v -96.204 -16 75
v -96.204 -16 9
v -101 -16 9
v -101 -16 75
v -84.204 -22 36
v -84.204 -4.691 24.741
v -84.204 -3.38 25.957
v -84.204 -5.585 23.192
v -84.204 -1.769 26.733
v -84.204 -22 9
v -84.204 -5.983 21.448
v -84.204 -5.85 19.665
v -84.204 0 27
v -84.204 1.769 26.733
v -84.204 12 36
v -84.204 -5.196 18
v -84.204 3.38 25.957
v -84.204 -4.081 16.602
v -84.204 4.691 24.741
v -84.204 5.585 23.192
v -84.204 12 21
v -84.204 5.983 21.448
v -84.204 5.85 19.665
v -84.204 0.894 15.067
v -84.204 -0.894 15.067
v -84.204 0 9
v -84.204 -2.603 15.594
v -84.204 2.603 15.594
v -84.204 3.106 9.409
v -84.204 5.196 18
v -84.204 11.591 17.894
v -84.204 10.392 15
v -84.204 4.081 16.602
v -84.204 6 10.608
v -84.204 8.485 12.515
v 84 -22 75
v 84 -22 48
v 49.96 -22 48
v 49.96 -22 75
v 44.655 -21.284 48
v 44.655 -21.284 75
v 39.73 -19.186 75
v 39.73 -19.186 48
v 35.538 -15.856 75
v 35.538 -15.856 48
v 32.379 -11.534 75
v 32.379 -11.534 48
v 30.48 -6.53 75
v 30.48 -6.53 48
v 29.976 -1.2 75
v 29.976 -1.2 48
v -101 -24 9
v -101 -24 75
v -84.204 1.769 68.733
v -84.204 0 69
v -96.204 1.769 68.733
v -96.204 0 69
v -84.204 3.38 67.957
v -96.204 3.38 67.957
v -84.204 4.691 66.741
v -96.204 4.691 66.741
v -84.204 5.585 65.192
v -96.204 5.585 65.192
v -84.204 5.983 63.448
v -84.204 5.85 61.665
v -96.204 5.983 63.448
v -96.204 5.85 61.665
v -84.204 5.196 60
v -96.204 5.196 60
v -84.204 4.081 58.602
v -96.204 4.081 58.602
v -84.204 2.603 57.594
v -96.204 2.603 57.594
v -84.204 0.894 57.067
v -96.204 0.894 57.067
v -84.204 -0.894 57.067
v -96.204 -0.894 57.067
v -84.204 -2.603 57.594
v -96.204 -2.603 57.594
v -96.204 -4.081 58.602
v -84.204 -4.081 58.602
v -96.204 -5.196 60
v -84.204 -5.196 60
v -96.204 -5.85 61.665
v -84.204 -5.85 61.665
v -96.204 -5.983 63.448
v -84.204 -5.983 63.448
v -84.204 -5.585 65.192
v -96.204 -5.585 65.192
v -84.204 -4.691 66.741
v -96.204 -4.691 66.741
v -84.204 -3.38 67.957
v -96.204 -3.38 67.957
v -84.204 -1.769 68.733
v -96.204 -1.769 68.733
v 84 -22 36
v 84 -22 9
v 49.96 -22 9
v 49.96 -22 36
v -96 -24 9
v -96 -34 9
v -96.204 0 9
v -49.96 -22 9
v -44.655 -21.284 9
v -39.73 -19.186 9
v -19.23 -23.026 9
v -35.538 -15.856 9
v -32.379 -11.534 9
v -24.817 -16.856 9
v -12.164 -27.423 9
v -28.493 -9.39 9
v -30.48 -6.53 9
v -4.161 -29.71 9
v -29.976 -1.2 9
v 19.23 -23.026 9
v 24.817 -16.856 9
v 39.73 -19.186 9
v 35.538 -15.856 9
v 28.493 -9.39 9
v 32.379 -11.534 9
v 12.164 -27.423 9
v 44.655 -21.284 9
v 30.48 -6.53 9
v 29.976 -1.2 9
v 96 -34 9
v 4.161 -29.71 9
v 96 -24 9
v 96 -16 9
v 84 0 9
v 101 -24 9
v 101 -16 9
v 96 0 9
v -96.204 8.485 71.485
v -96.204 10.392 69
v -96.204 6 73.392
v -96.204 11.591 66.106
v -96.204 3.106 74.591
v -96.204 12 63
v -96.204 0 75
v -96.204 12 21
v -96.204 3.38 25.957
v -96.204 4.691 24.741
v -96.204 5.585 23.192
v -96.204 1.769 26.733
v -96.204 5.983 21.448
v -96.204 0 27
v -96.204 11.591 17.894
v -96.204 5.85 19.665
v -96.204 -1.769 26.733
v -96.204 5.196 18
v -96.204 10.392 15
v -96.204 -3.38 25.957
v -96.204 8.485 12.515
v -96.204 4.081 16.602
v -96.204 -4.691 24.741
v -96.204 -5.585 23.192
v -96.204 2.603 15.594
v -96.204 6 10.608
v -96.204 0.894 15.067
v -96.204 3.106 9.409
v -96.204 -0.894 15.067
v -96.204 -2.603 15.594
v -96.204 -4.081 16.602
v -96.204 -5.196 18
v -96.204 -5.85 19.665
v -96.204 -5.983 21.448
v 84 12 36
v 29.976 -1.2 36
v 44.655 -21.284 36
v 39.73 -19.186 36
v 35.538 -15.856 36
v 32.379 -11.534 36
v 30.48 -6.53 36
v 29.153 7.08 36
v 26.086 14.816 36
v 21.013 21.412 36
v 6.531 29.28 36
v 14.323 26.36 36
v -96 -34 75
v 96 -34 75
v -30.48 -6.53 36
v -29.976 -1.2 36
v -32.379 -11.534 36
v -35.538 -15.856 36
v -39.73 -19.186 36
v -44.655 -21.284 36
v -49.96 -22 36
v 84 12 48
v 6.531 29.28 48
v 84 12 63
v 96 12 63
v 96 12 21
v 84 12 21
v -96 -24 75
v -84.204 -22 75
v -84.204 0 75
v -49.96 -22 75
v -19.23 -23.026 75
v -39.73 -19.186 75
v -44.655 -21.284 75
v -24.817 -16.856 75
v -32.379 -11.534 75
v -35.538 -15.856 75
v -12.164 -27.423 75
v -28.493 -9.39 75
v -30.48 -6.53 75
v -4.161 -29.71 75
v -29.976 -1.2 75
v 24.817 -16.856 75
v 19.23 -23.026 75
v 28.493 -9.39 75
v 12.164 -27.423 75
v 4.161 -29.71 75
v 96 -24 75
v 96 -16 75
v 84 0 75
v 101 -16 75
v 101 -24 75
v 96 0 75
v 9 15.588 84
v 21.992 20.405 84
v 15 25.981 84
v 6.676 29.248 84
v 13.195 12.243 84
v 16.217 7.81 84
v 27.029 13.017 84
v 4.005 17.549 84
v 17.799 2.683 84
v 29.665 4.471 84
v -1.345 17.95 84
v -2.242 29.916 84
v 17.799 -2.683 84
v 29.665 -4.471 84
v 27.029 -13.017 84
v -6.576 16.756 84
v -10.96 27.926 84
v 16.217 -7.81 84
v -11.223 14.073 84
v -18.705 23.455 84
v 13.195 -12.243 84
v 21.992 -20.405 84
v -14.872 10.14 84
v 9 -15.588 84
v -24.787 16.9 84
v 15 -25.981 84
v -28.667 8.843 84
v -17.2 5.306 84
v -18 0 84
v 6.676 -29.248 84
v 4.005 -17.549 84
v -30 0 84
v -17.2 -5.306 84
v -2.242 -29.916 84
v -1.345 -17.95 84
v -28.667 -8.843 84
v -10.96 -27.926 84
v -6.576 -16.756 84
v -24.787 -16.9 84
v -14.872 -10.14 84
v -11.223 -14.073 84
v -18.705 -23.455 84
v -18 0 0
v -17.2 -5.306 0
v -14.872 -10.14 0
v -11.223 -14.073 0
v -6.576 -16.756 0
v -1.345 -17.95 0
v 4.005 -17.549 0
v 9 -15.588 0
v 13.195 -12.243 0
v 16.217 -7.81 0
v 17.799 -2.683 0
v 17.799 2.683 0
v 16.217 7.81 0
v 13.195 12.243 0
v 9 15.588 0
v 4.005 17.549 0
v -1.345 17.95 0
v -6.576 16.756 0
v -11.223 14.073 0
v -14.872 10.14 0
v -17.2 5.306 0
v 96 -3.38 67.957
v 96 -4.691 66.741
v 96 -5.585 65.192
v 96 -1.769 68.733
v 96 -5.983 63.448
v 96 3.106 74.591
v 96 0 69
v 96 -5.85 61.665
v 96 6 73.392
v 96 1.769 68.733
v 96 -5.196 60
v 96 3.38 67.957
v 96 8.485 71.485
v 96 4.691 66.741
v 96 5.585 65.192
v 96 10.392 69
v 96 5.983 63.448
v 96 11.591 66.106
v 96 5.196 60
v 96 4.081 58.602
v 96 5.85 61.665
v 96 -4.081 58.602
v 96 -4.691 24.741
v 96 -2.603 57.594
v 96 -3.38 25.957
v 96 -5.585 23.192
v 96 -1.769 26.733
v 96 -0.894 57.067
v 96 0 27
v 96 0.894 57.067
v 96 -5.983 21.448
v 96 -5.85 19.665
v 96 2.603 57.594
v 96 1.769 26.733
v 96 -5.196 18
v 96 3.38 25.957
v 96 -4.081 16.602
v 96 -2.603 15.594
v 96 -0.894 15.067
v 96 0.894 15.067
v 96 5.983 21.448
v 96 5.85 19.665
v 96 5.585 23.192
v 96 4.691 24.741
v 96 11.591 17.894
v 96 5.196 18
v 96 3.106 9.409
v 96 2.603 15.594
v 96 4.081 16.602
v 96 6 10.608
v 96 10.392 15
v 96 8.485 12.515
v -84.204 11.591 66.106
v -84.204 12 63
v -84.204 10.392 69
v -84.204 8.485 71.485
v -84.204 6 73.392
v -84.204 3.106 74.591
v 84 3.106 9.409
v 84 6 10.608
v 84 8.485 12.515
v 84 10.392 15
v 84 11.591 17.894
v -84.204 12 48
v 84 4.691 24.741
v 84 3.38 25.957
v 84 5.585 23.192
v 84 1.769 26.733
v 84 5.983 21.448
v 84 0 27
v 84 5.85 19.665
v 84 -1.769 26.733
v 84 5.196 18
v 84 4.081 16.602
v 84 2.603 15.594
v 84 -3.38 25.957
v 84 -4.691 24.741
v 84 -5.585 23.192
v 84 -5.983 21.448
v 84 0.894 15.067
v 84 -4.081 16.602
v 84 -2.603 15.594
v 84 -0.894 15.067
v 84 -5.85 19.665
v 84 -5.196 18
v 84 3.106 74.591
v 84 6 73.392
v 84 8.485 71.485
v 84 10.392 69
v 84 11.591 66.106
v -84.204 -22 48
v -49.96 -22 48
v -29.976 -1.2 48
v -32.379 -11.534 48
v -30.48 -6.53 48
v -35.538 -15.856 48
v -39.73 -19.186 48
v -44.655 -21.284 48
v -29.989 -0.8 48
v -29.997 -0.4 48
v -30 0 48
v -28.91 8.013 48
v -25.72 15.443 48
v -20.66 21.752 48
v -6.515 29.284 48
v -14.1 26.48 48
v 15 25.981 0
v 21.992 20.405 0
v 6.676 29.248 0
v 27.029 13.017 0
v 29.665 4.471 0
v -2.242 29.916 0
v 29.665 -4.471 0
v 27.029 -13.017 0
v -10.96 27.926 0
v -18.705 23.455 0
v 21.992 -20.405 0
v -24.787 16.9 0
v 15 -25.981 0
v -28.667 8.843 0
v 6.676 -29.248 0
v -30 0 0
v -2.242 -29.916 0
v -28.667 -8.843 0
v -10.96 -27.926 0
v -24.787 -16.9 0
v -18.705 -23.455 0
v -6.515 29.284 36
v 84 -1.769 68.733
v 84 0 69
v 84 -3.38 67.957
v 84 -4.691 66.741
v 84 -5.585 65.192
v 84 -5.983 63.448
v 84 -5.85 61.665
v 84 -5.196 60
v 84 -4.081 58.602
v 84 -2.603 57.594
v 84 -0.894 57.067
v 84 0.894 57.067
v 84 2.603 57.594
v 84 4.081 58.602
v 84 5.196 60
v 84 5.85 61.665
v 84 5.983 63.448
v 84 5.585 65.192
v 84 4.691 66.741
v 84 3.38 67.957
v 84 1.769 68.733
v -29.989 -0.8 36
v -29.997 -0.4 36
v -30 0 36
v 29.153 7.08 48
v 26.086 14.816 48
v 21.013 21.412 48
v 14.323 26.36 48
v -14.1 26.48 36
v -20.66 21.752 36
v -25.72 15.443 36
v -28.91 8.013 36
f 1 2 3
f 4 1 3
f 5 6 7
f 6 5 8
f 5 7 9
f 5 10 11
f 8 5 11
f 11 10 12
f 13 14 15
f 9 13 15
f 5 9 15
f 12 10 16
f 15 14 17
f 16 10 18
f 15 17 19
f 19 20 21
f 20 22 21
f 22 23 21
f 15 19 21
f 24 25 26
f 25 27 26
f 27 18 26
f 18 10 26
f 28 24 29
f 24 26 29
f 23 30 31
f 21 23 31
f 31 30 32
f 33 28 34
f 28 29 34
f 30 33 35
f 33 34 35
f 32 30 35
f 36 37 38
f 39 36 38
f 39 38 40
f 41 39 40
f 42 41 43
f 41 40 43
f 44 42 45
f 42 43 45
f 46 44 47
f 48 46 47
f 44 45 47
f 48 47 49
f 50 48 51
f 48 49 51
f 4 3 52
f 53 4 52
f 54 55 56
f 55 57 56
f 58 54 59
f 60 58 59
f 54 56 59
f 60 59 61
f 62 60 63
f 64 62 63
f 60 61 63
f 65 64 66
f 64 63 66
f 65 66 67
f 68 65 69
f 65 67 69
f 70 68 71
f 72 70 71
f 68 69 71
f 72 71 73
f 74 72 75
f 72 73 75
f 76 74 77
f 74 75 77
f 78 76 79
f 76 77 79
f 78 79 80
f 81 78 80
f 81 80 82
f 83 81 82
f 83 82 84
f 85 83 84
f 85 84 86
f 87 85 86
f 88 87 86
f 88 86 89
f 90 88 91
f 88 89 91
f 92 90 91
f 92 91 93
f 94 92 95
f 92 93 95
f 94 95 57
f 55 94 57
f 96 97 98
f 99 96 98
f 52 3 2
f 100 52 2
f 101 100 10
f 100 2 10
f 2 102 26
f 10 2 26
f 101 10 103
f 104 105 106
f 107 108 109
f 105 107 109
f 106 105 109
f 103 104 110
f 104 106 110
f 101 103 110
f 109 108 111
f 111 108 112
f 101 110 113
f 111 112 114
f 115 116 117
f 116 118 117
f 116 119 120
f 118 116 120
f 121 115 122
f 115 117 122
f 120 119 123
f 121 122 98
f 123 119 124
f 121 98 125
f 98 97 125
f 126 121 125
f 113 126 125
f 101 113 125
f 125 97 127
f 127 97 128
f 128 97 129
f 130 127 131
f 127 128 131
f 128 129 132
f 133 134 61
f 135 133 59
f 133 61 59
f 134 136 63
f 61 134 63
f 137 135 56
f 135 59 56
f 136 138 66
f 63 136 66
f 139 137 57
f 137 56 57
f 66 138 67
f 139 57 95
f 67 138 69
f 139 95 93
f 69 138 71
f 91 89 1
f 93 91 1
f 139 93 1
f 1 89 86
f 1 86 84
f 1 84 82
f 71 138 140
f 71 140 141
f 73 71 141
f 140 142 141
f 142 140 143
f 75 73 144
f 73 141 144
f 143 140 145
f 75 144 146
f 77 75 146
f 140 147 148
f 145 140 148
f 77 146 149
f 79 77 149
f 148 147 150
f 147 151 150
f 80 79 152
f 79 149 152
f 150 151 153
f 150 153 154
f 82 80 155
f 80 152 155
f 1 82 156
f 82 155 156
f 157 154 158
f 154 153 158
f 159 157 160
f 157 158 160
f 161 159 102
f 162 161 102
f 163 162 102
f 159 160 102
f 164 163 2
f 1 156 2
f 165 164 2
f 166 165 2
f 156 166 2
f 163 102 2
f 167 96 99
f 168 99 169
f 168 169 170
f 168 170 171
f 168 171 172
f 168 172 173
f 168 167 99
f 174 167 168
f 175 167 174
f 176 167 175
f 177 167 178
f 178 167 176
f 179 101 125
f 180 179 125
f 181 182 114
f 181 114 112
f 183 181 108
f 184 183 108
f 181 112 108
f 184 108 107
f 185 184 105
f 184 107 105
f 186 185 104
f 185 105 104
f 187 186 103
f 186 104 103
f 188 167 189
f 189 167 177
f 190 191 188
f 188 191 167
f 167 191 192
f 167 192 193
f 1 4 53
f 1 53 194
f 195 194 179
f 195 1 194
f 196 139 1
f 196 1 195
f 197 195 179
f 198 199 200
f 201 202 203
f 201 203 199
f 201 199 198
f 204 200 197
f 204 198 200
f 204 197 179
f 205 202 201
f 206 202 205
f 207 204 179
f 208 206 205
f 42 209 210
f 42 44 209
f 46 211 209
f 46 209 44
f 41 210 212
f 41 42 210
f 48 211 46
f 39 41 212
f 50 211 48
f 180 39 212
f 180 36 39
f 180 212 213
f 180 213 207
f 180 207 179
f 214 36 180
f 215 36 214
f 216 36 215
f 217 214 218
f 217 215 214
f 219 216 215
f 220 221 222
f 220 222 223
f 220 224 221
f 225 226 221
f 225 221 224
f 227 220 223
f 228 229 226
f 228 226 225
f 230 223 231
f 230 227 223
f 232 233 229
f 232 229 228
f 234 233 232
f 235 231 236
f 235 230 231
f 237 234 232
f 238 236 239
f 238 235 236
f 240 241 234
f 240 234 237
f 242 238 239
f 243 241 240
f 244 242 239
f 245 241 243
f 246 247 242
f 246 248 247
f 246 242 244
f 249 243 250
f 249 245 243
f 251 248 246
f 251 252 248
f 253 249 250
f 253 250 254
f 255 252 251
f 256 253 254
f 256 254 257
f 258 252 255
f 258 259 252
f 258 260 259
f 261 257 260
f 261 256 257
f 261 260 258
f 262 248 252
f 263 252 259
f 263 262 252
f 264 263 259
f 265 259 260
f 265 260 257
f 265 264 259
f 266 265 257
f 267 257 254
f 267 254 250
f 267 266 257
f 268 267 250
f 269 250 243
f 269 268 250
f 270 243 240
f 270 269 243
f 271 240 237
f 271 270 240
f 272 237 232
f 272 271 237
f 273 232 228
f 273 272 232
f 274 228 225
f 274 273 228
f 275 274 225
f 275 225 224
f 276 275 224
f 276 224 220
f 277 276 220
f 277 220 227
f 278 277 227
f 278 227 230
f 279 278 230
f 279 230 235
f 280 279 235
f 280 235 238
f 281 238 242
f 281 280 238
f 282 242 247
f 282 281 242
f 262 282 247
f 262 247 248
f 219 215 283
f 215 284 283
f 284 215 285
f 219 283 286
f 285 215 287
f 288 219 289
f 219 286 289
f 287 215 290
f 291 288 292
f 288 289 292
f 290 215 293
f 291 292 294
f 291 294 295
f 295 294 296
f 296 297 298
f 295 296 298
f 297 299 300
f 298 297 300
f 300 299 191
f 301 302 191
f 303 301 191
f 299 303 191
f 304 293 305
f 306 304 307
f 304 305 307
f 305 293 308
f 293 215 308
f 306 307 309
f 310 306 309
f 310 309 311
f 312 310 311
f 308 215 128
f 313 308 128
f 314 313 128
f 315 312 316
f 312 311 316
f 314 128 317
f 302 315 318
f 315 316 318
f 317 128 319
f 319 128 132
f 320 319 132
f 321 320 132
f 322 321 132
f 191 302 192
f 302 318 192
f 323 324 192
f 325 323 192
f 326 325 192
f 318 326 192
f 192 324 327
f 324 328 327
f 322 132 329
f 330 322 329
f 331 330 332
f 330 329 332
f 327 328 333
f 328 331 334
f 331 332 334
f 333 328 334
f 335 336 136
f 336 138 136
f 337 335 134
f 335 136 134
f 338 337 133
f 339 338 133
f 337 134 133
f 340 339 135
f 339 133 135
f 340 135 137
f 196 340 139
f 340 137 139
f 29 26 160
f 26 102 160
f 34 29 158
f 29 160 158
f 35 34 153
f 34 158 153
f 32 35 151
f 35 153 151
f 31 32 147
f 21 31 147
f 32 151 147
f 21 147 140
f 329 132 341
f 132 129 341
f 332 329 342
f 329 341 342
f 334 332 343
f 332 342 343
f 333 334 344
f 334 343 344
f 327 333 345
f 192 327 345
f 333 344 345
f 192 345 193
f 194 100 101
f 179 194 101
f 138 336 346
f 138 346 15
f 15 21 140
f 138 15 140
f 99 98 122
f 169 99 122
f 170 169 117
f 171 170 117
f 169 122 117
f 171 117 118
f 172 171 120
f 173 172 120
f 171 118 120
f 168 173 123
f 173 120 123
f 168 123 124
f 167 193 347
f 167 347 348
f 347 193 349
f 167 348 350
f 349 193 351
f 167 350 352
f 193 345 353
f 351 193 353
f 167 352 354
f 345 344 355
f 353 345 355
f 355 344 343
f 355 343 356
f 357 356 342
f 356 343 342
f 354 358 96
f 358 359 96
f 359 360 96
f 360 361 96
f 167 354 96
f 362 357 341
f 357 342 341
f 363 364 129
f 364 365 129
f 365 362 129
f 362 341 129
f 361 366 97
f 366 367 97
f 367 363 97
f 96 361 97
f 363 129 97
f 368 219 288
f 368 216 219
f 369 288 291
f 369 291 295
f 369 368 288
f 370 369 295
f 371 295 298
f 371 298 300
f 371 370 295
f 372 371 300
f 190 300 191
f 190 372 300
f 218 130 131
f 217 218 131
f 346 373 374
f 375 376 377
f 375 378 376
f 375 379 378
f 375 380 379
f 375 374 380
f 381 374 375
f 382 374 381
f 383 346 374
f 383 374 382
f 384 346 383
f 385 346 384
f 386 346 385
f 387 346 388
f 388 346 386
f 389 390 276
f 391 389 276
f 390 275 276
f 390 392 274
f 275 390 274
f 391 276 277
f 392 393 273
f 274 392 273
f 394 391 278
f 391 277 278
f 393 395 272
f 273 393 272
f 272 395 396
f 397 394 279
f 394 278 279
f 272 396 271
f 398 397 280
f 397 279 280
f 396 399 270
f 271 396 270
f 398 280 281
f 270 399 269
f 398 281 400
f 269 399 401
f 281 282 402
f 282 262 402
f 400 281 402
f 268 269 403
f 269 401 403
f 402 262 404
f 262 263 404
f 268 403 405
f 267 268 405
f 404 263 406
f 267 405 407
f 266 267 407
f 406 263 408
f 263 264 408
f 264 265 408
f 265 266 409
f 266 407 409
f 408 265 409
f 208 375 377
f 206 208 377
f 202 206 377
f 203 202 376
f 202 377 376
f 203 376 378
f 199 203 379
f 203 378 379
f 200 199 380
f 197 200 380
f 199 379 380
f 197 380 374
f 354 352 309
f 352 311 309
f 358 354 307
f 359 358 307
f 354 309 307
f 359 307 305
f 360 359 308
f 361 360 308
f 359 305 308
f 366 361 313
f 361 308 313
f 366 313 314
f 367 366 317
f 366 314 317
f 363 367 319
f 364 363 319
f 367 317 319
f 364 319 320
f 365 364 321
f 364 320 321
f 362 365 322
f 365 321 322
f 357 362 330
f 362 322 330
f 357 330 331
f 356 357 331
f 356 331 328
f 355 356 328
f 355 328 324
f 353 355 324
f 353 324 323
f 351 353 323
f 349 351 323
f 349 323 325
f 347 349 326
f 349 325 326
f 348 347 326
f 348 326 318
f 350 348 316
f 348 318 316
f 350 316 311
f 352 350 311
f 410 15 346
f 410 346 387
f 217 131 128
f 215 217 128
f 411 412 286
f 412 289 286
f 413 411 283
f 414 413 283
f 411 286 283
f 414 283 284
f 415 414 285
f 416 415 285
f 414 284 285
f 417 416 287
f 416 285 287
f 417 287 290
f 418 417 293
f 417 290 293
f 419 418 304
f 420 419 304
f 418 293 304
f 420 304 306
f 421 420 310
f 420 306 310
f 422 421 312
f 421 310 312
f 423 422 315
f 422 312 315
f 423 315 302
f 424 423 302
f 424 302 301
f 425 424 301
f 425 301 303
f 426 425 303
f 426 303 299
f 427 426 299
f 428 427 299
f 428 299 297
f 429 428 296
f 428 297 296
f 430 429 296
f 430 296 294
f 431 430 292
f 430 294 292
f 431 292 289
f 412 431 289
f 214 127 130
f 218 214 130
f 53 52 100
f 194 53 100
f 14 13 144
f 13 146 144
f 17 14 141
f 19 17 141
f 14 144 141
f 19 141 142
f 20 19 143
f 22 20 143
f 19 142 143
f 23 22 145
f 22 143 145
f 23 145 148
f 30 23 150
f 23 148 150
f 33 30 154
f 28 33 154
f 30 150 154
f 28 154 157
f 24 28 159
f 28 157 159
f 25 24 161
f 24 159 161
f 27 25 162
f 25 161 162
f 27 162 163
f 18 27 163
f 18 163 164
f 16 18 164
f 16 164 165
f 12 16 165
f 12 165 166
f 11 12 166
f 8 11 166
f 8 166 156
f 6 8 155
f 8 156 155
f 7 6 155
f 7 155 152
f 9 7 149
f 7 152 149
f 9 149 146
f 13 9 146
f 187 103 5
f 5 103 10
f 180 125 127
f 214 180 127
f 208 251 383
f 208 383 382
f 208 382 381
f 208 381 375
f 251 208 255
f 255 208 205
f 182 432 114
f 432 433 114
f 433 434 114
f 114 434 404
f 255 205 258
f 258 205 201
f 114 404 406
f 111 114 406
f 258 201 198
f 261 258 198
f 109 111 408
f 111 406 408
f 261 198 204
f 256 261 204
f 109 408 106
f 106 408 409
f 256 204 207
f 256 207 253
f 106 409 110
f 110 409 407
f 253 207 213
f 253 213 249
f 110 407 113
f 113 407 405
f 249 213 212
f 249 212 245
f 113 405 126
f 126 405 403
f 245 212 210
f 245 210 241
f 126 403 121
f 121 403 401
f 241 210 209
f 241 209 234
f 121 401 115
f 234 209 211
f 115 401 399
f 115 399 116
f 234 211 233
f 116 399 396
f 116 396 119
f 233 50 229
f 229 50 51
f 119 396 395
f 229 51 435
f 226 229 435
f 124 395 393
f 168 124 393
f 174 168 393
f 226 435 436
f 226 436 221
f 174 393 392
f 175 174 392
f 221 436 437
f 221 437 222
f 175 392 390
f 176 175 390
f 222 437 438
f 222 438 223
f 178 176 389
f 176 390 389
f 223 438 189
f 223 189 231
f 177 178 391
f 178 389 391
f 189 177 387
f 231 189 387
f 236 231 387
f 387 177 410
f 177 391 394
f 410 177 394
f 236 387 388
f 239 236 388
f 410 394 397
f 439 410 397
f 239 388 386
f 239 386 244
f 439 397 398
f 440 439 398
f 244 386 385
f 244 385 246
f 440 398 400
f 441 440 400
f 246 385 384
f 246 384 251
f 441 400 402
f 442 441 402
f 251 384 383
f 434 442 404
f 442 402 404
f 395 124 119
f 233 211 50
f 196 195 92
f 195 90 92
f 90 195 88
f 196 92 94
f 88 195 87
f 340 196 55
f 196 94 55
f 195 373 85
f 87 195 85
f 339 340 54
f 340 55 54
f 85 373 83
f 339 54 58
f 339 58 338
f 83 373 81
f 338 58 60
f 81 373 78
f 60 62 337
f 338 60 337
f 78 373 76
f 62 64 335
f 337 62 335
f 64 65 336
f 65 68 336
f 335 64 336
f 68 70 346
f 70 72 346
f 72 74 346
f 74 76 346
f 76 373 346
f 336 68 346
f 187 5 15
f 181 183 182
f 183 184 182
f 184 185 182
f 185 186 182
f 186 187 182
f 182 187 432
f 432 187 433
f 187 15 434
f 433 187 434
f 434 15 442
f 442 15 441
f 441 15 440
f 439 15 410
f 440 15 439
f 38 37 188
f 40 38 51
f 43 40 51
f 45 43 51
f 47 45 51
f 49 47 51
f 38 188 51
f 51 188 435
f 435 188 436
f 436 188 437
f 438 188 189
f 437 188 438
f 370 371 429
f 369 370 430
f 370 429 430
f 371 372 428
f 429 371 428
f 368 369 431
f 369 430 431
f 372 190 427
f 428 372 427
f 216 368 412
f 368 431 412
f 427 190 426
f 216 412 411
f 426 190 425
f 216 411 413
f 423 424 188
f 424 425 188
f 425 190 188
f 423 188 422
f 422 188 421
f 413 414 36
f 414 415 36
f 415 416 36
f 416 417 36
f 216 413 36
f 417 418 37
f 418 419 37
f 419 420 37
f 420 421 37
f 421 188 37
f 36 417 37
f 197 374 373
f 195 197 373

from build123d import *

# Parameters (mm, degrees)
SKETCH1_R                      = 30
SKETCH1_R_2                    = 18
BOSS_EXTRUDE1_DEPTH            = 84
BOSS_EXTRUDE3_DEPTH            = 66
CUT_EXTRUDE1_REACH             = 218.843
SKETCH3_R                      = 6
CUT_EXTRUDE1_DIRECTION_2_DEPTH = 217.843261366
FILLET1_R                      = 12
CUT_EXTRUDE2_REACH             = 219.029
SKETCH4_R                      = 6
FILLET2_R                      = 12
RIB1_REACH                     = 116.547
SKETCH5_WALL_W                 = 310.682445014
SKETCH5_WALL_H                 = 12
RIB2_REACH                     = 116.547
SKETCH6_WALL_W                 = 310.466406556
SKETCH6_WALL_H                 = 12


with BuildPart() as part:
    # Sketch1 → Boss-Extrude1 (new body)
    with BuildSketch(Plane.XY):
        with Locations(Location((0, 0, 0), (0, 0, 180))):
            Circle(SKETCH1_R)
        with Locations(Location((0, 0, 0), (0, 0, 180))):
            Circle(SKETCH1_R_2, mode=Mode.SUBTRACT)
    extrude(amount=BOSS_EXTRUDE1_DEPTH)

    # Sketch2 → Boss-Extrude3 (add)
    with BuildSketch(Plane.XY.offset(9)):
        with BuildLine():
            Line((96, -24), (101, -24))
            Line((101, -24), (101, -16))
            Line((101, -16), (96, -16))
            Line((96, -16), (96, 12))
            Line((96, 12), (84, 12))
            Line((84, 12), (84, -22))
            Line((84, -22), (49.959983987, -22))
            ThreePointArc((49.959983987, -22), (35.537778885, -15.856406461), (29.975990392, -1.2))
            ThreePointArc((29.975990392, -1.2), (0, -30), (-29.975990392, -1.2))
            ThreePointArc((-29.975990392, -1.2), (-35.537778885, -15.856406461), (-49.959983987, -22))
            Line((-49.959983987, -22), (-84.204166847, -22))
            Line((-84.204166847, -22), (-84.204166847, 12))
            Line((-84.204166847, 12), (-96.204166847, 12))
            Line((-96.204166847, 12), (-96.204166847, -16))
            Line((-96.204166847, -16), (-101, -16))
            Line((-101, -16), (-101, -24))
            Line((-101, -24), (-96, -24))
            Line((-96, -24), (-96, -34))
            Line((-96, -34), (96, -34))
            Line((96, -34), (96, -24))
        make_face()
    extrude(amount=BOSS_EXTRUDE3_DEPTH)

    # Sketch3 → Cut-Extrude1 (cut, up to next)
    with BuildSketch(Plane(origin=(96, 0, 0), x_dir=(0, 0, -1), z_dir=(1, 0, 0)), mode=Mode.PRIVATE) as cut_extrude1_sk1:
        with Locations(Location((-63, 0, 0), (0, 0, 180))):
            Circle(SKETCH3_R)
    cut_extrude1_tool1 = extrude(cut_extrude1_sk1.sketch, amount=-CUT_EXTRUDE1_REACH, mode=Mode.PRIVATE) & part.part
    # Sketch3 → Cut-Extrude1 (cut, up to next)
    with BuildSketch(Plane(origin=(96, 0, 0), x_dir=(0, 0, -1), z_dir=(1, 0, 0)), mode=Mode.PRIVATE) as cut_extrude1_sk2:
        with Locations(Location((-21, 0, 0), (0, 0, 180))):
            Circle(SKETCH3_R)
    cut_extrude1_tool2 = extrude(cut_extrude1_sk2.sketch, amount=-CUT_EXTRUDE1_REACH, mode=Mode.PRIVATE) & part.part
    add(cut_extrude1_tool1.solids().sort_by_distance((96, 0, 63))[0], mode=Mode.SUBTRACT)
    add(cut_extrude1_tool2.solids().sort_by_distance((96, 0, 21))[0], mode=Mode.SUBTRACT)

    # Sketch3 → Cut-Extrude1 direction 2 (cut)
    with BuildSketch(Plane(origin=(96, 0, 0), x_dir=(0, 0, -1), z_dir=(1, 0, 0))):
        with Locations(Location((-63, 0, 0), (0, 0, 180))):
            Circle(SKETCH3_R)
        with Locations(Location((-21, 0, 0), (0, 0, 180))):
            Circle(SKETCH3_R)
    extrude(amount=CUT_EXTRUDE1_DIRECTION_2_DEPTH, mode=Mode.SUBTRACT)

    # Fillet1
    fillet1_edges = [part.edges().sort_by_distance(p)[0] for p in [
        (90, 12, 9),
        (90, 12, 75),
    ]]
    fillet(fillet1_edges, radius=FILLET1_R)

    # Sketch4 → Cut-Extrude2 (cut, up to next)
    with BuildSketch(Plane.ZY.offset(96.204166847), mode=Mode.PRIVATE) as cut_extrude2_sk1:
        with Locations((21, 0)):
            Circle(SKETCH4_R)
    cut_extrude2_tool1 = extrude(cut_extrude2_sk1.sketch, amount=-CUT_EXTRUDE2_REACH, mode=Mode.PRIVATE) & part.part
    # Sketch4 → Cut-Extrude2 (cut, up to next)
    with BuildSketch(Plane.ZY.offset(96.204166847), mode=Mode.PRIVATE) as cut_extrude2_sk2:
        with Locations((63, 0)):
            Circle(SKETCH4_R)
    cut_extrude2_tool2 = extrude(cut_extrude2_sk2.sketch, amount=-CUT_EXTRUDE2_REACH, mode=Mode.PRIVATE) & part.part
    add(cut_extrude2_tool1.solids().sort_by_distance((-96.204167, 0, 21))[0], mode=Mode.SUBTRACT)
    add(cut_extrude2_tool2.solids().sort_by_distance((-96.204167, 0, 63))[0], mode=Mode.SUBTRACT)

    # Fillet2
    fillet2_edges = [part.edges().sort_by_distance(p)[0] for p in [
        (-90.204166847, 12, 9),
        (-90.204166847, 12, 75),
    ]]
    fillet(fillet2_edges, radius=FILLET2_R)

    # Sketch5 wall → Rib1 (add, up to next)
    with BuildSketch(Plane(origin=(-45.359592124, 20.642016154, 42), x_dir=(0.976134410289, 0.217167246725, 0), z_dir=(-0.217167246725, 0.976134410289, 0)), mode=Mode.PRIVATE) as rib1_sk1:
        Rectangle(SKETCH5_WALL_W, SKETCH5_WALL_H)
    rib1_tool1 = extrude(rib1_sk1.sketch, amount=-RIB1_REACH, mode=Mode.PRIVATE) - part.part
    add(rib1_tool1.solids().sort_by_distance((-45.359592124, 20.642016154, 42))[0])

    # Sketch6 wall → Rib2 (add, up to next)
    with BuildSketch(Plane(origin=(45.265686516, 20.640194383, 42), x_dir=(-0.976012958873, 0.217712434444, 0), z_dir=(-0.217712434444, -0.976012958873, 0)), mode=Mode.PRIVATE) as rib2_sk1:
        Rectangle(SKETCH6_WALL_W, SKETCH6_WALL_H)
    rib2_tool1 = extrude(rib2_sk1.sketch, amount=RIB2_REACH, mode=Mode.PRIVATE) - part.part
    add(rib2_tool1.solids().sort_by_distance((45.265686516, 20.640194383, 42))[0])


solid = part.part
